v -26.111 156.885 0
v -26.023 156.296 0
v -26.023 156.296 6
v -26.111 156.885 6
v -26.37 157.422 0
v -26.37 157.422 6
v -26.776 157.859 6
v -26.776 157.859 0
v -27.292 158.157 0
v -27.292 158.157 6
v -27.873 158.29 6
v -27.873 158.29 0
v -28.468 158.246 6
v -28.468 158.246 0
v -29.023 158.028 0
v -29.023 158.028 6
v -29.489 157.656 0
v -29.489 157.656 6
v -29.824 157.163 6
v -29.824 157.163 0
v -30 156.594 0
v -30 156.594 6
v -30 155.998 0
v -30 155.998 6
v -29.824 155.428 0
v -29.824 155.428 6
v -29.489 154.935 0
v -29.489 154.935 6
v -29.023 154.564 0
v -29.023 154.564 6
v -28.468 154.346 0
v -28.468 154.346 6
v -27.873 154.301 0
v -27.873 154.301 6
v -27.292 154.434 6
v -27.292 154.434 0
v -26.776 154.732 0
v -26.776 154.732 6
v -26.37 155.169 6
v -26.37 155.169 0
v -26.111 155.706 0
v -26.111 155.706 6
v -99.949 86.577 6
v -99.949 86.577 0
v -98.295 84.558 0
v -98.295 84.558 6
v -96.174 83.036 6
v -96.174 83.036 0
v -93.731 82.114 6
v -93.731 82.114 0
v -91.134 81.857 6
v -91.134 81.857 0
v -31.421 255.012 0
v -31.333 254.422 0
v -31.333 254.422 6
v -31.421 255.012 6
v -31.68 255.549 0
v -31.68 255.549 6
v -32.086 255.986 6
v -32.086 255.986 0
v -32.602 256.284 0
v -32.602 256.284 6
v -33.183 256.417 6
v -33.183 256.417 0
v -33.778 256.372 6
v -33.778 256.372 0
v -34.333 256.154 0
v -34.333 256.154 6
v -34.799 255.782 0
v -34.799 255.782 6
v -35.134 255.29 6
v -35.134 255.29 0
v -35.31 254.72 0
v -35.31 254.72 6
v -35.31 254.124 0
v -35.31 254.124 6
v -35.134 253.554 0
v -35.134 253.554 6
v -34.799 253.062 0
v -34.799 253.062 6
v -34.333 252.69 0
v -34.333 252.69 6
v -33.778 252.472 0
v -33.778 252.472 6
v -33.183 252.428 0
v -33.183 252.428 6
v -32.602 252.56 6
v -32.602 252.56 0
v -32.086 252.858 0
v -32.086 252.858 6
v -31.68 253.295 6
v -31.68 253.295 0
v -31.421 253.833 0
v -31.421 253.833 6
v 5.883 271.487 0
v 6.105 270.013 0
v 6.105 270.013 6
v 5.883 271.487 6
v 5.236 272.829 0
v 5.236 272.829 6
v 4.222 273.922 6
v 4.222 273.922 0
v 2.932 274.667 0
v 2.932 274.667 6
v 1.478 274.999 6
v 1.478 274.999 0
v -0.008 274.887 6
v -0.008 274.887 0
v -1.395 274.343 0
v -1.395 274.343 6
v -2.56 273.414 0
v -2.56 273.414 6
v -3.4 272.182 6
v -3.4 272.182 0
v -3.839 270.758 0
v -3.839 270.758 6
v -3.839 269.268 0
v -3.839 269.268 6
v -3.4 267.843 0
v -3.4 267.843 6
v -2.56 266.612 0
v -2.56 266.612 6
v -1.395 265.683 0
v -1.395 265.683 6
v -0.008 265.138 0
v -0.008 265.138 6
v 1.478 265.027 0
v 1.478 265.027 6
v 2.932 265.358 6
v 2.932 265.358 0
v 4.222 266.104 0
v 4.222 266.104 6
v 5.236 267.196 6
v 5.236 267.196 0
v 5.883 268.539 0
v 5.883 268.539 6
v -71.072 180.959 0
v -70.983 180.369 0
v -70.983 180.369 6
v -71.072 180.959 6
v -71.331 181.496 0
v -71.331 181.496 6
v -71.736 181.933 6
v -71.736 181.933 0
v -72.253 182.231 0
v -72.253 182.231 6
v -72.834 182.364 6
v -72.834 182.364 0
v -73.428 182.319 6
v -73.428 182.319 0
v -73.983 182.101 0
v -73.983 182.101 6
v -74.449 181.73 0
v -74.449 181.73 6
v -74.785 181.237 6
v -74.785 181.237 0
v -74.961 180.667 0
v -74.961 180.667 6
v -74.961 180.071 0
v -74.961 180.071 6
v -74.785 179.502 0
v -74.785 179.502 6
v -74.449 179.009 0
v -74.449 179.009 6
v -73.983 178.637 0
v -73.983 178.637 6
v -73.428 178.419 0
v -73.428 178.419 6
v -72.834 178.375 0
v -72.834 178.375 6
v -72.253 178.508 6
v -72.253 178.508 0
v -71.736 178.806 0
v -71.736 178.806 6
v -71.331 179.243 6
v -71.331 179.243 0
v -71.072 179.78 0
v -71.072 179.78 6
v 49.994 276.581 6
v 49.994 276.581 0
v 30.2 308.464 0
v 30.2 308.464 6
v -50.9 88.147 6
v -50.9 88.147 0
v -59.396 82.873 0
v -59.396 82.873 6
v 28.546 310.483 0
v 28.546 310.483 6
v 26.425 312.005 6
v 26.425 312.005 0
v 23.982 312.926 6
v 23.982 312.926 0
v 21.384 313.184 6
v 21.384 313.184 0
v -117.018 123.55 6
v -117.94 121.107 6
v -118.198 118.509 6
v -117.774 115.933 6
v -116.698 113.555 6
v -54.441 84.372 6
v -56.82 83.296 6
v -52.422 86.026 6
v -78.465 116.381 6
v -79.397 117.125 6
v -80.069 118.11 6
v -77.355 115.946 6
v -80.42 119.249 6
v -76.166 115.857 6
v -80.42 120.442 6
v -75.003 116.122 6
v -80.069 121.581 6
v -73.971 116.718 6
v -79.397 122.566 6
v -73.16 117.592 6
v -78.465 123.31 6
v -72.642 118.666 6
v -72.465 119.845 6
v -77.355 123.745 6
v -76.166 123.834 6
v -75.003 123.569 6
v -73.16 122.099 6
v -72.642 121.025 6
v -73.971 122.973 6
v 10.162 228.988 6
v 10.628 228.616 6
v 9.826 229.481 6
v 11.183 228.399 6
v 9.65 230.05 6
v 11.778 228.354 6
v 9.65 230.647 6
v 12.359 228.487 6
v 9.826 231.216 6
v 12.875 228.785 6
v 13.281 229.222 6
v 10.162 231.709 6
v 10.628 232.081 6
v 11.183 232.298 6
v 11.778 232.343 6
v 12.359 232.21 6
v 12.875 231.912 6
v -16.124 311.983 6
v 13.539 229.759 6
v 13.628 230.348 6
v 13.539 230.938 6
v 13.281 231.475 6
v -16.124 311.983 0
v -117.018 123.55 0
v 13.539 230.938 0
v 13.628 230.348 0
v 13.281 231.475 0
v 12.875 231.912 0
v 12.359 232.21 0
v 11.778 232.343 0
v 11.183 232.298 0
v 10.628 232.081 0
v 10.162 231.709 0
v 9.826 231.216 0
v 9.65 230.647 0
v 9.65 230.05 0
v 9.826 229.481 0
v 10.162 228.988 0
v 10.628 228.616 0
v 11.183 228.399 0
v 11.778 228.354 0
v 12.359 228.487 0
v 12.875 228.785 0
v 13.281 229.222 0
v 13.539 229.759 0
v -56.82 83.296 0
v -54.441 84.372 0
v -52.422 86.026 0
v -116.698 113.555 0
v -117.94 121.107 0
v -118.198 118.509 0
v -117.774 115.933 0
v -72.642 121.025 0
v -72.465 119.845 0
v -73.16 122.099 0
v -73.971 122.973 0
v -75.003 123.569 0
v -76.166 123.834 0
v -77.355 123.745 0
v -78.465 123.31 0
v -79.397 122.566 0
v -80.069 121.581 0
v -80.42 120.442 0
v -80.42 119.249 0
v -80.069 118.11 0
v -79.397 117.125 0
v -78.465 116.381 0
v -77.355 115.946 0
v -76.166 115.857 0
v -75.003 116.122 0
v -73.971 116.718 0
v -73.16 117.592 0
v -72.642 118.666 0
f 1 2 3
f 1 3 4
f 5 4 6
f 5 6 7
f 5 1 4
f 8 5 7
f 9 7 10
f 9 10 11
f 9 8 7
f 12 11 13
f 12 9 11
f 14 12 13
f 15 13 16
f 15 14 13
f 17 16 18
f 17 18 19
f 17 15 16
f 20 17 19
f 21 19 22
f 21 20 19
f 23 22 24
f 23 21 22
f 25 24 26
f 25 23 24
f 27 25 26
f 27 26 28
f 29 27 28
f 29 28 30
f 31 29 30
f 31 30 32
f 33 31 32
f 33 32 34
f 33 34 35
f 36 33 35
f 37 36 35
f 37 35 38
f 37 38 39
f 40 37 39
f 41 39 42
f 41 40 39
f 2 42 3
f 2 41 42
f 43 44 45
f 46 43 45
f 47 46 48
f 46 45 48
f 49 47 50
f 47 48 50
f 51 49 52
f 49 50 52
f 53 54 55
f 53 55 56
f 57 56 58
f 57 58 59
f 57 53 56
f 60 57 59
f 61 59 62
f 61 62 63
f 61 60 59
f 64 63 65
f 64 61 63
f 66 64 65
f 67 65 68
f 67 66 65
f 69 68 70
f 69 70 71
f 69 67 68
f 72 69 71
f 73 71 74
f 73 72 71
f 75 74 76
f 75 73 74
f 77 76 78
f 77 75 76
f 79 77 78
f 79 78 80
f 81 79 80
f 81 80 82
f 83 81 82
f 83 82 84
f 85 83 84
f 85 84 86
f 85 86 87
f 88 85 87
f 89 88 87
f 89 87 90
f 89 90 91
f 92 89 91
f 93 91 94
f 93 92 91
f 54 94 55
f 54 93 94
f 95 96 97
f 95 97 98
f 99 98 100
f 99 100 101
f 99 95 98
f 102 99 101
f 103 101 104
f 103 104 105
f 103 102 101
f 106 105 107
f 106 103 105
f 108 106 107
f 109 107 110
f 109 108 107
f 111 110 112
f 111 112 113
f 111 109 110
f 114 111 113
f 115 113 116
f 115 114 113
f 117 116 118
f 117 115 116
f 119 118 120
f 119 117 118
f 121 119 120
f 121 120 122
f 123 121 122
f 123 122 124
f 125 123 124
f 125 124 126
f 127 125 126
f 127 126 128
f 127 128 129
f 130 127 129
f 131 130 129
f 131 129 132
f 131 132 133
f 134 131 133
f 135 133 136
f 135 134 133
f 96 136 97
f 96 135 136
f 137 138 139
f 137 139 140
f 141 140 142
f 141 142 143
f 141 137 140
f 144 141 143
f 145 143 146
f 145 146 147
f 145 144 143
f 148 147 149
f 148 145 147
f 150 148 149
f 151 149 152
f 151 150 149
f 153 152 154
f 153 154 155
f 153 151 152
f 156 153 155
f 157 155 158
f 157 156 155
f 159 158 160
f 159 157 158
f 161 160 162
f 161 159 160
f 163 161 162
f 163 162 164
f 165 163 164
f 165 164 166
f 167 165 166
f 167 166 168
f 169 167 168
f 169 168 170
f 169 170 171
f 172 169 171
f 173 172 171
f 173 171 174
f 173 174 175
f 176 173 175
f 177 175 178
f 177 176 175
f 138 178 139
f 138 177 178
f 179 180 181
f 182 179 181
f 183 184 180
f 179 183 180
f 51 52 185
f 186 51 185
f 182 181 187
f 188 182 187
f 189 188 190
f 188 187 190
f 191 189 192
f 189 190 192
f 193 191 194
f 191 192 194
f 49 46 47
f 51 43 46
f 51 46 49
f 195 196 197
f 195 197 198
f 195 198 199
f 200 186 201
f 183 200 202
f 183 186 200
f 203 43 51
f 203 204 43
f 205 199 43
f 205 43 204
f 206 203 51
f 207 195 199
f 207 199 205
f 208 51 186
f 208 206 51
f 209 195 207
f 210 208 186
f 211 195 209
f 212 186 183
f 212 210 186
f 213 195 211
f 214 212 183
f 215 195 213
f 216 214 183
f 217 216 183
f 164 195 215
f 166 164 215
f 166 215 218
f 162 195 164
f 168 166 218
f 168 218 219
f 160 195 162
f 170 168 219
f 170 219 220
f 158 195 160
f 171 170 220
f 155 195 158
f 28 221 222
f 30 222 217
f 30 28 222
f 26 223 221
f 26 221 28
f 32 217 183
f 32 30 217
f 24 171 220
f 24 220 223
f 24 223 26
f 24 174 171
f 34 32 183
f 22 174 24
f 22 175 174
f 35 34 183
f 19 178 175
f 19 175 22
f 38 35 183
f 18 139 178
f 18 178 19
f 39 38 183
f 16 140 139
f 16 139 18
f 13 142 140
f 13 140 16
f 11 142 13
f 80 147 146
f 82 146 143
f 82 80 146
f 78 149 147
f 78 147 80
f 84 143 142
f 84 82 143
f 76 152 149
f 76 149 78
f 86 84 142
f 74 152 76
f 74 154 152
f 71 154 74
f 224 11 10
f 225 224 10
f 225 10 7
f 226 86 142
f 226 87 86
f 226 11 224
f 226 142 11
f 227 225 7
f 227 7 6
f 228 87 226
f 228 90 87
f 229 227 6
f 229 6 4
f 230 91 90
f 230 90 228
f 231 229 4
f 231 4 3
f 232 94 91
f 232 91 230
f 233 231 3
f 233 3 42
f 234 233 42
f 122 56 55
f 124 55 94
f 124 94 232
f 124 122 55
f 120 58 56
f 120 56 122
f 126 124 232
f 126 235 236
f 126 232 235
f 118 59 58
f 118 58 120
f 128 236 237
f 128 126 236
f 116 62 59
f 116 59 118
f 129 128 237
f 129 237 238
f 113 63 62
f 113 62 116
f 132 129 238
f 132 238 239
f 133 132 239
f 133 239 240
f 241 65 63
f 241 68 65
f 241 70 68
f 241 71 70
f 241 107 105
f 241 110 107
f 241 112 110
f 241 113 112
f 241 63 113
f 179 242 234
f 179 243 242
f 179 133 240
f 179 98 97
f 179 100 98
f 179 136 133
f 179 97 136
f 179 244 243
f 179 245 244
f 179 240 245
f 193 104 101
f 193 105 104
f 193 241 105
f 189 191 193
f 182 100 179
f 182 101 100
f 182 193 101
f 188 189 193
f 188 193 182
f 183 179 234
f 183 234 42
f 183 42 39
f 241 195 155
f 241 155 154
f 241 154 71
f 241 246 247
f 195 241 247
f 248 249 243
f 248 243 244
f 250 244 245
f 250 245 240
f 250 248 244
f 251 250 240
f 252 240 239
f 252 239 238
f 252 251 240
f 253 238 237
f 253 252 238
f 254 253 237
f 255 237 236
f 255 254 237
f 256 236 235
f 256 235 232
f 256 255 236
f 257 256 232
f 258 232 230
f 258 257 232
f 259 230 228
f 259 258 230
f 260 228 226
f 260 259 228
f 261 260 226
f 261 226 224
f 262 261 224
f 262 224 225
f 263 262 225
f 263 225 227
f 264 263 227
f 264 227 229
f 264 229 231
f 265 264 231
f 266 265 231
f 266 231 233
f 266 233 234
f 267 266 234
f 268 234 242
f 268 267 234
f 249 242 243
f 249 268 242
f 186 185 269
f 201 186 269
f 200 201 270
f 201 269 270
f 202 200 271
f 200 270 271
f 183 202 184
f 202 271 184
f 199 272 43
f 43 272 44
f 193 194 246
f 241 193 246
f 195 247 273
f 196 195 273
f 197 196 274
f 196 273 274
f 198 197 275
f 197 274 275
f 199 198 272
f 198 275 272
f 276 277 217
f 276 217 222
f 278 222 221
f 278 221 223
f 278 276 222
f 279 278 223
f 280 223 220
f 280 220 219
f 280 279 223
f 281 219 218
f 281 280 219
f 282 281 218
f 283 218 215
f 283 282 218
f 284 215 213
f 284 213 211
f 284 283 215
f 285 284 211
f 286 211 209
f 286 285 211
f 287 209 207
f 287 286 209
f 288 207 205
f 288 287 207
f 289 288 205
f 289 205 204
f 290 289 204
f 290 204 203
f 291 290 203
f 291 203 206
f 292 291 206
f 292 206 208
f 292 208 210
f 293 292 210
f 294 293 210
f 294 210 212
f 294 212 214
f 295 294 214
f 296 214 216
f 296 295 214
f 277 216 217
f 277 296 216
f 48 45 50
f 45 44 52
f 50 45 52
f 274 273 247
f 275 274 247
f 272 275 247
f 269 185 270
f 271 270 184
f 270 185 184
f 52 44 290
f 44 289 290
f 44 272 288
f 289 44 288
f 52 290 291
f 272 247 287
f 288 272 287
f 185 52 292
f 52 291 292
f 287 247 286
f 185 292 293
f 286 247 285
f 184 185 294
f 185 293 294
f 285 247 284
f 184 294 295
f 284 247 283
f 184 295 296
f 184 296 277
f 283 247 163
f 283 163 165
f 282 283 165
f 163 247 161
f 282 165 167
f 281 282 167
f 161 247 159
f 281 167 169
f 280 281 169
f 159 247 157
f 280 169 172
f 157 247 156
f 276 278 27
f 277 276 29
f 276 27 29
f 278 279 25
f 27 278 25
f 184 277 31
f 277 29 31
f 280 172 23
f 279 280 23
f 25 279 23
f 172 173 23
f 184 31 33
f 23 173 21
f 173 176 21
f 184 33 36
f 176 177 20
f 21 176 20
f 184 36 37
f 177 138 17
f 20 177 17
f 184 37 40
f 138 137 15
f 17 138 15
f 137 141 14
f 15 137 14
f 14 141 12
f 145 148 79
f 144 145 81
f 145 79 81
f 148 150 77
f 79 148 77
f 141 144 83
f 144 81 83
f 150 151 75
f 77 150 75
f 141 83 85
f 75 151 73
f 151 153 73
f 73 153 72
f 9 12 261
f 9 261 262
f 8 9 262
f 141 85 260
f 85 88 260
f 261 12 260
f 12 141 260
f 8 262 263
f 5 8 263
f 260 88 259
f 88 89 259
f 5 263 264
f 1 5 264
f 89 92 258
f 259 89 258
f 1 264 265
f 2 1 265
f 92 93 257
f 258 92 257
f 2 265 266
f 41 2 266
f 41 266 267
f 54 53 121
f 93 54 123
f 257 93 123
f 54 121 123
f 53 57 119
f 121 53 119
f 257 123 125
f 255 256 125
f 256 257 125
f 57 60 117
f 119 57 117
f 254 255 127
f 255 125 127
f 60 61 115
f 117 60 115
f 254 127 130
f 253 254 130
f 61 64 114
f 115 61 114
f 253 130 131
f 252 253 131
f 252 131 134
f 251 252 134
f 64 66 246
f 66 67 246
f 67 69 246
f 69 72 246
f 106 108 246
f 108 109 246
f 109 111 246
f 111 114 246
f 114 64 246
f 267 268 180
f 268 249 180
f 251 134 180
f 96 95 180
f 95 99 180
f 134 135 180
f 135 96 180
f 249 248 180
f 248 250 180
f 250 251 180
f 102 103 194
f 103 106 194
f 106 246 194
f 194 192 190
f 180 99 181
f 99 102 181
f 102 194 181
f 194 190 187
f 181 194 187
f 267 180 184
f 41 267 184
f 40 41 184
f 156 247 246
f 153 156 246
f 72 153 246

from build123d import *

# Parameters (mm, degrees)
SKETCH1_R           = 2
SKETCH1_R_2         = 5
SKETCH1_R_3         = 4
BOSS_EXTRUDE1_DEPTH = 6


with BuildPart() as part:
    # Sketch1 → Boss-Extrude1 (new body)
    with BuildSketch(Plane.XY):
        with BuildLine():
            Line((-91.133667709, 81.856650449), (-59.395664216, 82.872754588))
            ThreePointArc((-59.395664216, 82.872754588), (-54.441095215, 84.371809376), (-50.89983999, 88.147313406))
            Line((-50.89983999, 88.147313406), (49.994476852, 276.580618392))
            Line((49.994476852, 276.580618392), (30.200235155, 308.463550017))
            ThreePointArc((30.200235155, 308.463550017), (26.424731126, 312.004805242), (21.384421112, 313.183870214))
            Line((21.384421112, 313.183870214), (-16.124128471, 311.983019868))
            Line((-16.124128471, 311.983019868), (-117.018445312, 123.549714881))
            ThreePointArc((-117.018445312, 123.549714881), (-118.197510284, 118.509404867), (-116.698455495, 113.554835867))
            Line((-116.698455495, 113.554835867), (-99.949481752, 86.576970646))
            ThreePointArc((-99.949481752, 86.576970646), (-96.173977723, 83.035715421), (-91.133667709, 81.856650449))
        make_face()
        with Locations((11.628148729, 230.348497445)):
            Circle(SKETCH1_R, mode=Mode.SUBTRACT)
        with Locations((1.104829999, 270.012836125)):
            Circle(SKETCH1_R_2, mode=Mode.SUBTRACT)
        with Locations((-33.33250289, 254.422130449)):
            Circle(SKETCH1_R, mode=Mode.SUBTRACT)
        with Locations((-28.022540924, 156.295659484)):
            Circle(SKETCH1_R, mode=Mode.SUBTRACT)
        with Locations((-72.983192543, 180.369292488)):
            Circle(SKETCH1_R, mode=Mode.SUBTRACT)
        with Locations((-76.464627777, 119.845498823)):
            Circle(SKETCH1_R_3, mode=Mode.SUBTRACT)
    extrude(amount=BOSS_EXTRUDE1_DEPTH)


solid = part.part
